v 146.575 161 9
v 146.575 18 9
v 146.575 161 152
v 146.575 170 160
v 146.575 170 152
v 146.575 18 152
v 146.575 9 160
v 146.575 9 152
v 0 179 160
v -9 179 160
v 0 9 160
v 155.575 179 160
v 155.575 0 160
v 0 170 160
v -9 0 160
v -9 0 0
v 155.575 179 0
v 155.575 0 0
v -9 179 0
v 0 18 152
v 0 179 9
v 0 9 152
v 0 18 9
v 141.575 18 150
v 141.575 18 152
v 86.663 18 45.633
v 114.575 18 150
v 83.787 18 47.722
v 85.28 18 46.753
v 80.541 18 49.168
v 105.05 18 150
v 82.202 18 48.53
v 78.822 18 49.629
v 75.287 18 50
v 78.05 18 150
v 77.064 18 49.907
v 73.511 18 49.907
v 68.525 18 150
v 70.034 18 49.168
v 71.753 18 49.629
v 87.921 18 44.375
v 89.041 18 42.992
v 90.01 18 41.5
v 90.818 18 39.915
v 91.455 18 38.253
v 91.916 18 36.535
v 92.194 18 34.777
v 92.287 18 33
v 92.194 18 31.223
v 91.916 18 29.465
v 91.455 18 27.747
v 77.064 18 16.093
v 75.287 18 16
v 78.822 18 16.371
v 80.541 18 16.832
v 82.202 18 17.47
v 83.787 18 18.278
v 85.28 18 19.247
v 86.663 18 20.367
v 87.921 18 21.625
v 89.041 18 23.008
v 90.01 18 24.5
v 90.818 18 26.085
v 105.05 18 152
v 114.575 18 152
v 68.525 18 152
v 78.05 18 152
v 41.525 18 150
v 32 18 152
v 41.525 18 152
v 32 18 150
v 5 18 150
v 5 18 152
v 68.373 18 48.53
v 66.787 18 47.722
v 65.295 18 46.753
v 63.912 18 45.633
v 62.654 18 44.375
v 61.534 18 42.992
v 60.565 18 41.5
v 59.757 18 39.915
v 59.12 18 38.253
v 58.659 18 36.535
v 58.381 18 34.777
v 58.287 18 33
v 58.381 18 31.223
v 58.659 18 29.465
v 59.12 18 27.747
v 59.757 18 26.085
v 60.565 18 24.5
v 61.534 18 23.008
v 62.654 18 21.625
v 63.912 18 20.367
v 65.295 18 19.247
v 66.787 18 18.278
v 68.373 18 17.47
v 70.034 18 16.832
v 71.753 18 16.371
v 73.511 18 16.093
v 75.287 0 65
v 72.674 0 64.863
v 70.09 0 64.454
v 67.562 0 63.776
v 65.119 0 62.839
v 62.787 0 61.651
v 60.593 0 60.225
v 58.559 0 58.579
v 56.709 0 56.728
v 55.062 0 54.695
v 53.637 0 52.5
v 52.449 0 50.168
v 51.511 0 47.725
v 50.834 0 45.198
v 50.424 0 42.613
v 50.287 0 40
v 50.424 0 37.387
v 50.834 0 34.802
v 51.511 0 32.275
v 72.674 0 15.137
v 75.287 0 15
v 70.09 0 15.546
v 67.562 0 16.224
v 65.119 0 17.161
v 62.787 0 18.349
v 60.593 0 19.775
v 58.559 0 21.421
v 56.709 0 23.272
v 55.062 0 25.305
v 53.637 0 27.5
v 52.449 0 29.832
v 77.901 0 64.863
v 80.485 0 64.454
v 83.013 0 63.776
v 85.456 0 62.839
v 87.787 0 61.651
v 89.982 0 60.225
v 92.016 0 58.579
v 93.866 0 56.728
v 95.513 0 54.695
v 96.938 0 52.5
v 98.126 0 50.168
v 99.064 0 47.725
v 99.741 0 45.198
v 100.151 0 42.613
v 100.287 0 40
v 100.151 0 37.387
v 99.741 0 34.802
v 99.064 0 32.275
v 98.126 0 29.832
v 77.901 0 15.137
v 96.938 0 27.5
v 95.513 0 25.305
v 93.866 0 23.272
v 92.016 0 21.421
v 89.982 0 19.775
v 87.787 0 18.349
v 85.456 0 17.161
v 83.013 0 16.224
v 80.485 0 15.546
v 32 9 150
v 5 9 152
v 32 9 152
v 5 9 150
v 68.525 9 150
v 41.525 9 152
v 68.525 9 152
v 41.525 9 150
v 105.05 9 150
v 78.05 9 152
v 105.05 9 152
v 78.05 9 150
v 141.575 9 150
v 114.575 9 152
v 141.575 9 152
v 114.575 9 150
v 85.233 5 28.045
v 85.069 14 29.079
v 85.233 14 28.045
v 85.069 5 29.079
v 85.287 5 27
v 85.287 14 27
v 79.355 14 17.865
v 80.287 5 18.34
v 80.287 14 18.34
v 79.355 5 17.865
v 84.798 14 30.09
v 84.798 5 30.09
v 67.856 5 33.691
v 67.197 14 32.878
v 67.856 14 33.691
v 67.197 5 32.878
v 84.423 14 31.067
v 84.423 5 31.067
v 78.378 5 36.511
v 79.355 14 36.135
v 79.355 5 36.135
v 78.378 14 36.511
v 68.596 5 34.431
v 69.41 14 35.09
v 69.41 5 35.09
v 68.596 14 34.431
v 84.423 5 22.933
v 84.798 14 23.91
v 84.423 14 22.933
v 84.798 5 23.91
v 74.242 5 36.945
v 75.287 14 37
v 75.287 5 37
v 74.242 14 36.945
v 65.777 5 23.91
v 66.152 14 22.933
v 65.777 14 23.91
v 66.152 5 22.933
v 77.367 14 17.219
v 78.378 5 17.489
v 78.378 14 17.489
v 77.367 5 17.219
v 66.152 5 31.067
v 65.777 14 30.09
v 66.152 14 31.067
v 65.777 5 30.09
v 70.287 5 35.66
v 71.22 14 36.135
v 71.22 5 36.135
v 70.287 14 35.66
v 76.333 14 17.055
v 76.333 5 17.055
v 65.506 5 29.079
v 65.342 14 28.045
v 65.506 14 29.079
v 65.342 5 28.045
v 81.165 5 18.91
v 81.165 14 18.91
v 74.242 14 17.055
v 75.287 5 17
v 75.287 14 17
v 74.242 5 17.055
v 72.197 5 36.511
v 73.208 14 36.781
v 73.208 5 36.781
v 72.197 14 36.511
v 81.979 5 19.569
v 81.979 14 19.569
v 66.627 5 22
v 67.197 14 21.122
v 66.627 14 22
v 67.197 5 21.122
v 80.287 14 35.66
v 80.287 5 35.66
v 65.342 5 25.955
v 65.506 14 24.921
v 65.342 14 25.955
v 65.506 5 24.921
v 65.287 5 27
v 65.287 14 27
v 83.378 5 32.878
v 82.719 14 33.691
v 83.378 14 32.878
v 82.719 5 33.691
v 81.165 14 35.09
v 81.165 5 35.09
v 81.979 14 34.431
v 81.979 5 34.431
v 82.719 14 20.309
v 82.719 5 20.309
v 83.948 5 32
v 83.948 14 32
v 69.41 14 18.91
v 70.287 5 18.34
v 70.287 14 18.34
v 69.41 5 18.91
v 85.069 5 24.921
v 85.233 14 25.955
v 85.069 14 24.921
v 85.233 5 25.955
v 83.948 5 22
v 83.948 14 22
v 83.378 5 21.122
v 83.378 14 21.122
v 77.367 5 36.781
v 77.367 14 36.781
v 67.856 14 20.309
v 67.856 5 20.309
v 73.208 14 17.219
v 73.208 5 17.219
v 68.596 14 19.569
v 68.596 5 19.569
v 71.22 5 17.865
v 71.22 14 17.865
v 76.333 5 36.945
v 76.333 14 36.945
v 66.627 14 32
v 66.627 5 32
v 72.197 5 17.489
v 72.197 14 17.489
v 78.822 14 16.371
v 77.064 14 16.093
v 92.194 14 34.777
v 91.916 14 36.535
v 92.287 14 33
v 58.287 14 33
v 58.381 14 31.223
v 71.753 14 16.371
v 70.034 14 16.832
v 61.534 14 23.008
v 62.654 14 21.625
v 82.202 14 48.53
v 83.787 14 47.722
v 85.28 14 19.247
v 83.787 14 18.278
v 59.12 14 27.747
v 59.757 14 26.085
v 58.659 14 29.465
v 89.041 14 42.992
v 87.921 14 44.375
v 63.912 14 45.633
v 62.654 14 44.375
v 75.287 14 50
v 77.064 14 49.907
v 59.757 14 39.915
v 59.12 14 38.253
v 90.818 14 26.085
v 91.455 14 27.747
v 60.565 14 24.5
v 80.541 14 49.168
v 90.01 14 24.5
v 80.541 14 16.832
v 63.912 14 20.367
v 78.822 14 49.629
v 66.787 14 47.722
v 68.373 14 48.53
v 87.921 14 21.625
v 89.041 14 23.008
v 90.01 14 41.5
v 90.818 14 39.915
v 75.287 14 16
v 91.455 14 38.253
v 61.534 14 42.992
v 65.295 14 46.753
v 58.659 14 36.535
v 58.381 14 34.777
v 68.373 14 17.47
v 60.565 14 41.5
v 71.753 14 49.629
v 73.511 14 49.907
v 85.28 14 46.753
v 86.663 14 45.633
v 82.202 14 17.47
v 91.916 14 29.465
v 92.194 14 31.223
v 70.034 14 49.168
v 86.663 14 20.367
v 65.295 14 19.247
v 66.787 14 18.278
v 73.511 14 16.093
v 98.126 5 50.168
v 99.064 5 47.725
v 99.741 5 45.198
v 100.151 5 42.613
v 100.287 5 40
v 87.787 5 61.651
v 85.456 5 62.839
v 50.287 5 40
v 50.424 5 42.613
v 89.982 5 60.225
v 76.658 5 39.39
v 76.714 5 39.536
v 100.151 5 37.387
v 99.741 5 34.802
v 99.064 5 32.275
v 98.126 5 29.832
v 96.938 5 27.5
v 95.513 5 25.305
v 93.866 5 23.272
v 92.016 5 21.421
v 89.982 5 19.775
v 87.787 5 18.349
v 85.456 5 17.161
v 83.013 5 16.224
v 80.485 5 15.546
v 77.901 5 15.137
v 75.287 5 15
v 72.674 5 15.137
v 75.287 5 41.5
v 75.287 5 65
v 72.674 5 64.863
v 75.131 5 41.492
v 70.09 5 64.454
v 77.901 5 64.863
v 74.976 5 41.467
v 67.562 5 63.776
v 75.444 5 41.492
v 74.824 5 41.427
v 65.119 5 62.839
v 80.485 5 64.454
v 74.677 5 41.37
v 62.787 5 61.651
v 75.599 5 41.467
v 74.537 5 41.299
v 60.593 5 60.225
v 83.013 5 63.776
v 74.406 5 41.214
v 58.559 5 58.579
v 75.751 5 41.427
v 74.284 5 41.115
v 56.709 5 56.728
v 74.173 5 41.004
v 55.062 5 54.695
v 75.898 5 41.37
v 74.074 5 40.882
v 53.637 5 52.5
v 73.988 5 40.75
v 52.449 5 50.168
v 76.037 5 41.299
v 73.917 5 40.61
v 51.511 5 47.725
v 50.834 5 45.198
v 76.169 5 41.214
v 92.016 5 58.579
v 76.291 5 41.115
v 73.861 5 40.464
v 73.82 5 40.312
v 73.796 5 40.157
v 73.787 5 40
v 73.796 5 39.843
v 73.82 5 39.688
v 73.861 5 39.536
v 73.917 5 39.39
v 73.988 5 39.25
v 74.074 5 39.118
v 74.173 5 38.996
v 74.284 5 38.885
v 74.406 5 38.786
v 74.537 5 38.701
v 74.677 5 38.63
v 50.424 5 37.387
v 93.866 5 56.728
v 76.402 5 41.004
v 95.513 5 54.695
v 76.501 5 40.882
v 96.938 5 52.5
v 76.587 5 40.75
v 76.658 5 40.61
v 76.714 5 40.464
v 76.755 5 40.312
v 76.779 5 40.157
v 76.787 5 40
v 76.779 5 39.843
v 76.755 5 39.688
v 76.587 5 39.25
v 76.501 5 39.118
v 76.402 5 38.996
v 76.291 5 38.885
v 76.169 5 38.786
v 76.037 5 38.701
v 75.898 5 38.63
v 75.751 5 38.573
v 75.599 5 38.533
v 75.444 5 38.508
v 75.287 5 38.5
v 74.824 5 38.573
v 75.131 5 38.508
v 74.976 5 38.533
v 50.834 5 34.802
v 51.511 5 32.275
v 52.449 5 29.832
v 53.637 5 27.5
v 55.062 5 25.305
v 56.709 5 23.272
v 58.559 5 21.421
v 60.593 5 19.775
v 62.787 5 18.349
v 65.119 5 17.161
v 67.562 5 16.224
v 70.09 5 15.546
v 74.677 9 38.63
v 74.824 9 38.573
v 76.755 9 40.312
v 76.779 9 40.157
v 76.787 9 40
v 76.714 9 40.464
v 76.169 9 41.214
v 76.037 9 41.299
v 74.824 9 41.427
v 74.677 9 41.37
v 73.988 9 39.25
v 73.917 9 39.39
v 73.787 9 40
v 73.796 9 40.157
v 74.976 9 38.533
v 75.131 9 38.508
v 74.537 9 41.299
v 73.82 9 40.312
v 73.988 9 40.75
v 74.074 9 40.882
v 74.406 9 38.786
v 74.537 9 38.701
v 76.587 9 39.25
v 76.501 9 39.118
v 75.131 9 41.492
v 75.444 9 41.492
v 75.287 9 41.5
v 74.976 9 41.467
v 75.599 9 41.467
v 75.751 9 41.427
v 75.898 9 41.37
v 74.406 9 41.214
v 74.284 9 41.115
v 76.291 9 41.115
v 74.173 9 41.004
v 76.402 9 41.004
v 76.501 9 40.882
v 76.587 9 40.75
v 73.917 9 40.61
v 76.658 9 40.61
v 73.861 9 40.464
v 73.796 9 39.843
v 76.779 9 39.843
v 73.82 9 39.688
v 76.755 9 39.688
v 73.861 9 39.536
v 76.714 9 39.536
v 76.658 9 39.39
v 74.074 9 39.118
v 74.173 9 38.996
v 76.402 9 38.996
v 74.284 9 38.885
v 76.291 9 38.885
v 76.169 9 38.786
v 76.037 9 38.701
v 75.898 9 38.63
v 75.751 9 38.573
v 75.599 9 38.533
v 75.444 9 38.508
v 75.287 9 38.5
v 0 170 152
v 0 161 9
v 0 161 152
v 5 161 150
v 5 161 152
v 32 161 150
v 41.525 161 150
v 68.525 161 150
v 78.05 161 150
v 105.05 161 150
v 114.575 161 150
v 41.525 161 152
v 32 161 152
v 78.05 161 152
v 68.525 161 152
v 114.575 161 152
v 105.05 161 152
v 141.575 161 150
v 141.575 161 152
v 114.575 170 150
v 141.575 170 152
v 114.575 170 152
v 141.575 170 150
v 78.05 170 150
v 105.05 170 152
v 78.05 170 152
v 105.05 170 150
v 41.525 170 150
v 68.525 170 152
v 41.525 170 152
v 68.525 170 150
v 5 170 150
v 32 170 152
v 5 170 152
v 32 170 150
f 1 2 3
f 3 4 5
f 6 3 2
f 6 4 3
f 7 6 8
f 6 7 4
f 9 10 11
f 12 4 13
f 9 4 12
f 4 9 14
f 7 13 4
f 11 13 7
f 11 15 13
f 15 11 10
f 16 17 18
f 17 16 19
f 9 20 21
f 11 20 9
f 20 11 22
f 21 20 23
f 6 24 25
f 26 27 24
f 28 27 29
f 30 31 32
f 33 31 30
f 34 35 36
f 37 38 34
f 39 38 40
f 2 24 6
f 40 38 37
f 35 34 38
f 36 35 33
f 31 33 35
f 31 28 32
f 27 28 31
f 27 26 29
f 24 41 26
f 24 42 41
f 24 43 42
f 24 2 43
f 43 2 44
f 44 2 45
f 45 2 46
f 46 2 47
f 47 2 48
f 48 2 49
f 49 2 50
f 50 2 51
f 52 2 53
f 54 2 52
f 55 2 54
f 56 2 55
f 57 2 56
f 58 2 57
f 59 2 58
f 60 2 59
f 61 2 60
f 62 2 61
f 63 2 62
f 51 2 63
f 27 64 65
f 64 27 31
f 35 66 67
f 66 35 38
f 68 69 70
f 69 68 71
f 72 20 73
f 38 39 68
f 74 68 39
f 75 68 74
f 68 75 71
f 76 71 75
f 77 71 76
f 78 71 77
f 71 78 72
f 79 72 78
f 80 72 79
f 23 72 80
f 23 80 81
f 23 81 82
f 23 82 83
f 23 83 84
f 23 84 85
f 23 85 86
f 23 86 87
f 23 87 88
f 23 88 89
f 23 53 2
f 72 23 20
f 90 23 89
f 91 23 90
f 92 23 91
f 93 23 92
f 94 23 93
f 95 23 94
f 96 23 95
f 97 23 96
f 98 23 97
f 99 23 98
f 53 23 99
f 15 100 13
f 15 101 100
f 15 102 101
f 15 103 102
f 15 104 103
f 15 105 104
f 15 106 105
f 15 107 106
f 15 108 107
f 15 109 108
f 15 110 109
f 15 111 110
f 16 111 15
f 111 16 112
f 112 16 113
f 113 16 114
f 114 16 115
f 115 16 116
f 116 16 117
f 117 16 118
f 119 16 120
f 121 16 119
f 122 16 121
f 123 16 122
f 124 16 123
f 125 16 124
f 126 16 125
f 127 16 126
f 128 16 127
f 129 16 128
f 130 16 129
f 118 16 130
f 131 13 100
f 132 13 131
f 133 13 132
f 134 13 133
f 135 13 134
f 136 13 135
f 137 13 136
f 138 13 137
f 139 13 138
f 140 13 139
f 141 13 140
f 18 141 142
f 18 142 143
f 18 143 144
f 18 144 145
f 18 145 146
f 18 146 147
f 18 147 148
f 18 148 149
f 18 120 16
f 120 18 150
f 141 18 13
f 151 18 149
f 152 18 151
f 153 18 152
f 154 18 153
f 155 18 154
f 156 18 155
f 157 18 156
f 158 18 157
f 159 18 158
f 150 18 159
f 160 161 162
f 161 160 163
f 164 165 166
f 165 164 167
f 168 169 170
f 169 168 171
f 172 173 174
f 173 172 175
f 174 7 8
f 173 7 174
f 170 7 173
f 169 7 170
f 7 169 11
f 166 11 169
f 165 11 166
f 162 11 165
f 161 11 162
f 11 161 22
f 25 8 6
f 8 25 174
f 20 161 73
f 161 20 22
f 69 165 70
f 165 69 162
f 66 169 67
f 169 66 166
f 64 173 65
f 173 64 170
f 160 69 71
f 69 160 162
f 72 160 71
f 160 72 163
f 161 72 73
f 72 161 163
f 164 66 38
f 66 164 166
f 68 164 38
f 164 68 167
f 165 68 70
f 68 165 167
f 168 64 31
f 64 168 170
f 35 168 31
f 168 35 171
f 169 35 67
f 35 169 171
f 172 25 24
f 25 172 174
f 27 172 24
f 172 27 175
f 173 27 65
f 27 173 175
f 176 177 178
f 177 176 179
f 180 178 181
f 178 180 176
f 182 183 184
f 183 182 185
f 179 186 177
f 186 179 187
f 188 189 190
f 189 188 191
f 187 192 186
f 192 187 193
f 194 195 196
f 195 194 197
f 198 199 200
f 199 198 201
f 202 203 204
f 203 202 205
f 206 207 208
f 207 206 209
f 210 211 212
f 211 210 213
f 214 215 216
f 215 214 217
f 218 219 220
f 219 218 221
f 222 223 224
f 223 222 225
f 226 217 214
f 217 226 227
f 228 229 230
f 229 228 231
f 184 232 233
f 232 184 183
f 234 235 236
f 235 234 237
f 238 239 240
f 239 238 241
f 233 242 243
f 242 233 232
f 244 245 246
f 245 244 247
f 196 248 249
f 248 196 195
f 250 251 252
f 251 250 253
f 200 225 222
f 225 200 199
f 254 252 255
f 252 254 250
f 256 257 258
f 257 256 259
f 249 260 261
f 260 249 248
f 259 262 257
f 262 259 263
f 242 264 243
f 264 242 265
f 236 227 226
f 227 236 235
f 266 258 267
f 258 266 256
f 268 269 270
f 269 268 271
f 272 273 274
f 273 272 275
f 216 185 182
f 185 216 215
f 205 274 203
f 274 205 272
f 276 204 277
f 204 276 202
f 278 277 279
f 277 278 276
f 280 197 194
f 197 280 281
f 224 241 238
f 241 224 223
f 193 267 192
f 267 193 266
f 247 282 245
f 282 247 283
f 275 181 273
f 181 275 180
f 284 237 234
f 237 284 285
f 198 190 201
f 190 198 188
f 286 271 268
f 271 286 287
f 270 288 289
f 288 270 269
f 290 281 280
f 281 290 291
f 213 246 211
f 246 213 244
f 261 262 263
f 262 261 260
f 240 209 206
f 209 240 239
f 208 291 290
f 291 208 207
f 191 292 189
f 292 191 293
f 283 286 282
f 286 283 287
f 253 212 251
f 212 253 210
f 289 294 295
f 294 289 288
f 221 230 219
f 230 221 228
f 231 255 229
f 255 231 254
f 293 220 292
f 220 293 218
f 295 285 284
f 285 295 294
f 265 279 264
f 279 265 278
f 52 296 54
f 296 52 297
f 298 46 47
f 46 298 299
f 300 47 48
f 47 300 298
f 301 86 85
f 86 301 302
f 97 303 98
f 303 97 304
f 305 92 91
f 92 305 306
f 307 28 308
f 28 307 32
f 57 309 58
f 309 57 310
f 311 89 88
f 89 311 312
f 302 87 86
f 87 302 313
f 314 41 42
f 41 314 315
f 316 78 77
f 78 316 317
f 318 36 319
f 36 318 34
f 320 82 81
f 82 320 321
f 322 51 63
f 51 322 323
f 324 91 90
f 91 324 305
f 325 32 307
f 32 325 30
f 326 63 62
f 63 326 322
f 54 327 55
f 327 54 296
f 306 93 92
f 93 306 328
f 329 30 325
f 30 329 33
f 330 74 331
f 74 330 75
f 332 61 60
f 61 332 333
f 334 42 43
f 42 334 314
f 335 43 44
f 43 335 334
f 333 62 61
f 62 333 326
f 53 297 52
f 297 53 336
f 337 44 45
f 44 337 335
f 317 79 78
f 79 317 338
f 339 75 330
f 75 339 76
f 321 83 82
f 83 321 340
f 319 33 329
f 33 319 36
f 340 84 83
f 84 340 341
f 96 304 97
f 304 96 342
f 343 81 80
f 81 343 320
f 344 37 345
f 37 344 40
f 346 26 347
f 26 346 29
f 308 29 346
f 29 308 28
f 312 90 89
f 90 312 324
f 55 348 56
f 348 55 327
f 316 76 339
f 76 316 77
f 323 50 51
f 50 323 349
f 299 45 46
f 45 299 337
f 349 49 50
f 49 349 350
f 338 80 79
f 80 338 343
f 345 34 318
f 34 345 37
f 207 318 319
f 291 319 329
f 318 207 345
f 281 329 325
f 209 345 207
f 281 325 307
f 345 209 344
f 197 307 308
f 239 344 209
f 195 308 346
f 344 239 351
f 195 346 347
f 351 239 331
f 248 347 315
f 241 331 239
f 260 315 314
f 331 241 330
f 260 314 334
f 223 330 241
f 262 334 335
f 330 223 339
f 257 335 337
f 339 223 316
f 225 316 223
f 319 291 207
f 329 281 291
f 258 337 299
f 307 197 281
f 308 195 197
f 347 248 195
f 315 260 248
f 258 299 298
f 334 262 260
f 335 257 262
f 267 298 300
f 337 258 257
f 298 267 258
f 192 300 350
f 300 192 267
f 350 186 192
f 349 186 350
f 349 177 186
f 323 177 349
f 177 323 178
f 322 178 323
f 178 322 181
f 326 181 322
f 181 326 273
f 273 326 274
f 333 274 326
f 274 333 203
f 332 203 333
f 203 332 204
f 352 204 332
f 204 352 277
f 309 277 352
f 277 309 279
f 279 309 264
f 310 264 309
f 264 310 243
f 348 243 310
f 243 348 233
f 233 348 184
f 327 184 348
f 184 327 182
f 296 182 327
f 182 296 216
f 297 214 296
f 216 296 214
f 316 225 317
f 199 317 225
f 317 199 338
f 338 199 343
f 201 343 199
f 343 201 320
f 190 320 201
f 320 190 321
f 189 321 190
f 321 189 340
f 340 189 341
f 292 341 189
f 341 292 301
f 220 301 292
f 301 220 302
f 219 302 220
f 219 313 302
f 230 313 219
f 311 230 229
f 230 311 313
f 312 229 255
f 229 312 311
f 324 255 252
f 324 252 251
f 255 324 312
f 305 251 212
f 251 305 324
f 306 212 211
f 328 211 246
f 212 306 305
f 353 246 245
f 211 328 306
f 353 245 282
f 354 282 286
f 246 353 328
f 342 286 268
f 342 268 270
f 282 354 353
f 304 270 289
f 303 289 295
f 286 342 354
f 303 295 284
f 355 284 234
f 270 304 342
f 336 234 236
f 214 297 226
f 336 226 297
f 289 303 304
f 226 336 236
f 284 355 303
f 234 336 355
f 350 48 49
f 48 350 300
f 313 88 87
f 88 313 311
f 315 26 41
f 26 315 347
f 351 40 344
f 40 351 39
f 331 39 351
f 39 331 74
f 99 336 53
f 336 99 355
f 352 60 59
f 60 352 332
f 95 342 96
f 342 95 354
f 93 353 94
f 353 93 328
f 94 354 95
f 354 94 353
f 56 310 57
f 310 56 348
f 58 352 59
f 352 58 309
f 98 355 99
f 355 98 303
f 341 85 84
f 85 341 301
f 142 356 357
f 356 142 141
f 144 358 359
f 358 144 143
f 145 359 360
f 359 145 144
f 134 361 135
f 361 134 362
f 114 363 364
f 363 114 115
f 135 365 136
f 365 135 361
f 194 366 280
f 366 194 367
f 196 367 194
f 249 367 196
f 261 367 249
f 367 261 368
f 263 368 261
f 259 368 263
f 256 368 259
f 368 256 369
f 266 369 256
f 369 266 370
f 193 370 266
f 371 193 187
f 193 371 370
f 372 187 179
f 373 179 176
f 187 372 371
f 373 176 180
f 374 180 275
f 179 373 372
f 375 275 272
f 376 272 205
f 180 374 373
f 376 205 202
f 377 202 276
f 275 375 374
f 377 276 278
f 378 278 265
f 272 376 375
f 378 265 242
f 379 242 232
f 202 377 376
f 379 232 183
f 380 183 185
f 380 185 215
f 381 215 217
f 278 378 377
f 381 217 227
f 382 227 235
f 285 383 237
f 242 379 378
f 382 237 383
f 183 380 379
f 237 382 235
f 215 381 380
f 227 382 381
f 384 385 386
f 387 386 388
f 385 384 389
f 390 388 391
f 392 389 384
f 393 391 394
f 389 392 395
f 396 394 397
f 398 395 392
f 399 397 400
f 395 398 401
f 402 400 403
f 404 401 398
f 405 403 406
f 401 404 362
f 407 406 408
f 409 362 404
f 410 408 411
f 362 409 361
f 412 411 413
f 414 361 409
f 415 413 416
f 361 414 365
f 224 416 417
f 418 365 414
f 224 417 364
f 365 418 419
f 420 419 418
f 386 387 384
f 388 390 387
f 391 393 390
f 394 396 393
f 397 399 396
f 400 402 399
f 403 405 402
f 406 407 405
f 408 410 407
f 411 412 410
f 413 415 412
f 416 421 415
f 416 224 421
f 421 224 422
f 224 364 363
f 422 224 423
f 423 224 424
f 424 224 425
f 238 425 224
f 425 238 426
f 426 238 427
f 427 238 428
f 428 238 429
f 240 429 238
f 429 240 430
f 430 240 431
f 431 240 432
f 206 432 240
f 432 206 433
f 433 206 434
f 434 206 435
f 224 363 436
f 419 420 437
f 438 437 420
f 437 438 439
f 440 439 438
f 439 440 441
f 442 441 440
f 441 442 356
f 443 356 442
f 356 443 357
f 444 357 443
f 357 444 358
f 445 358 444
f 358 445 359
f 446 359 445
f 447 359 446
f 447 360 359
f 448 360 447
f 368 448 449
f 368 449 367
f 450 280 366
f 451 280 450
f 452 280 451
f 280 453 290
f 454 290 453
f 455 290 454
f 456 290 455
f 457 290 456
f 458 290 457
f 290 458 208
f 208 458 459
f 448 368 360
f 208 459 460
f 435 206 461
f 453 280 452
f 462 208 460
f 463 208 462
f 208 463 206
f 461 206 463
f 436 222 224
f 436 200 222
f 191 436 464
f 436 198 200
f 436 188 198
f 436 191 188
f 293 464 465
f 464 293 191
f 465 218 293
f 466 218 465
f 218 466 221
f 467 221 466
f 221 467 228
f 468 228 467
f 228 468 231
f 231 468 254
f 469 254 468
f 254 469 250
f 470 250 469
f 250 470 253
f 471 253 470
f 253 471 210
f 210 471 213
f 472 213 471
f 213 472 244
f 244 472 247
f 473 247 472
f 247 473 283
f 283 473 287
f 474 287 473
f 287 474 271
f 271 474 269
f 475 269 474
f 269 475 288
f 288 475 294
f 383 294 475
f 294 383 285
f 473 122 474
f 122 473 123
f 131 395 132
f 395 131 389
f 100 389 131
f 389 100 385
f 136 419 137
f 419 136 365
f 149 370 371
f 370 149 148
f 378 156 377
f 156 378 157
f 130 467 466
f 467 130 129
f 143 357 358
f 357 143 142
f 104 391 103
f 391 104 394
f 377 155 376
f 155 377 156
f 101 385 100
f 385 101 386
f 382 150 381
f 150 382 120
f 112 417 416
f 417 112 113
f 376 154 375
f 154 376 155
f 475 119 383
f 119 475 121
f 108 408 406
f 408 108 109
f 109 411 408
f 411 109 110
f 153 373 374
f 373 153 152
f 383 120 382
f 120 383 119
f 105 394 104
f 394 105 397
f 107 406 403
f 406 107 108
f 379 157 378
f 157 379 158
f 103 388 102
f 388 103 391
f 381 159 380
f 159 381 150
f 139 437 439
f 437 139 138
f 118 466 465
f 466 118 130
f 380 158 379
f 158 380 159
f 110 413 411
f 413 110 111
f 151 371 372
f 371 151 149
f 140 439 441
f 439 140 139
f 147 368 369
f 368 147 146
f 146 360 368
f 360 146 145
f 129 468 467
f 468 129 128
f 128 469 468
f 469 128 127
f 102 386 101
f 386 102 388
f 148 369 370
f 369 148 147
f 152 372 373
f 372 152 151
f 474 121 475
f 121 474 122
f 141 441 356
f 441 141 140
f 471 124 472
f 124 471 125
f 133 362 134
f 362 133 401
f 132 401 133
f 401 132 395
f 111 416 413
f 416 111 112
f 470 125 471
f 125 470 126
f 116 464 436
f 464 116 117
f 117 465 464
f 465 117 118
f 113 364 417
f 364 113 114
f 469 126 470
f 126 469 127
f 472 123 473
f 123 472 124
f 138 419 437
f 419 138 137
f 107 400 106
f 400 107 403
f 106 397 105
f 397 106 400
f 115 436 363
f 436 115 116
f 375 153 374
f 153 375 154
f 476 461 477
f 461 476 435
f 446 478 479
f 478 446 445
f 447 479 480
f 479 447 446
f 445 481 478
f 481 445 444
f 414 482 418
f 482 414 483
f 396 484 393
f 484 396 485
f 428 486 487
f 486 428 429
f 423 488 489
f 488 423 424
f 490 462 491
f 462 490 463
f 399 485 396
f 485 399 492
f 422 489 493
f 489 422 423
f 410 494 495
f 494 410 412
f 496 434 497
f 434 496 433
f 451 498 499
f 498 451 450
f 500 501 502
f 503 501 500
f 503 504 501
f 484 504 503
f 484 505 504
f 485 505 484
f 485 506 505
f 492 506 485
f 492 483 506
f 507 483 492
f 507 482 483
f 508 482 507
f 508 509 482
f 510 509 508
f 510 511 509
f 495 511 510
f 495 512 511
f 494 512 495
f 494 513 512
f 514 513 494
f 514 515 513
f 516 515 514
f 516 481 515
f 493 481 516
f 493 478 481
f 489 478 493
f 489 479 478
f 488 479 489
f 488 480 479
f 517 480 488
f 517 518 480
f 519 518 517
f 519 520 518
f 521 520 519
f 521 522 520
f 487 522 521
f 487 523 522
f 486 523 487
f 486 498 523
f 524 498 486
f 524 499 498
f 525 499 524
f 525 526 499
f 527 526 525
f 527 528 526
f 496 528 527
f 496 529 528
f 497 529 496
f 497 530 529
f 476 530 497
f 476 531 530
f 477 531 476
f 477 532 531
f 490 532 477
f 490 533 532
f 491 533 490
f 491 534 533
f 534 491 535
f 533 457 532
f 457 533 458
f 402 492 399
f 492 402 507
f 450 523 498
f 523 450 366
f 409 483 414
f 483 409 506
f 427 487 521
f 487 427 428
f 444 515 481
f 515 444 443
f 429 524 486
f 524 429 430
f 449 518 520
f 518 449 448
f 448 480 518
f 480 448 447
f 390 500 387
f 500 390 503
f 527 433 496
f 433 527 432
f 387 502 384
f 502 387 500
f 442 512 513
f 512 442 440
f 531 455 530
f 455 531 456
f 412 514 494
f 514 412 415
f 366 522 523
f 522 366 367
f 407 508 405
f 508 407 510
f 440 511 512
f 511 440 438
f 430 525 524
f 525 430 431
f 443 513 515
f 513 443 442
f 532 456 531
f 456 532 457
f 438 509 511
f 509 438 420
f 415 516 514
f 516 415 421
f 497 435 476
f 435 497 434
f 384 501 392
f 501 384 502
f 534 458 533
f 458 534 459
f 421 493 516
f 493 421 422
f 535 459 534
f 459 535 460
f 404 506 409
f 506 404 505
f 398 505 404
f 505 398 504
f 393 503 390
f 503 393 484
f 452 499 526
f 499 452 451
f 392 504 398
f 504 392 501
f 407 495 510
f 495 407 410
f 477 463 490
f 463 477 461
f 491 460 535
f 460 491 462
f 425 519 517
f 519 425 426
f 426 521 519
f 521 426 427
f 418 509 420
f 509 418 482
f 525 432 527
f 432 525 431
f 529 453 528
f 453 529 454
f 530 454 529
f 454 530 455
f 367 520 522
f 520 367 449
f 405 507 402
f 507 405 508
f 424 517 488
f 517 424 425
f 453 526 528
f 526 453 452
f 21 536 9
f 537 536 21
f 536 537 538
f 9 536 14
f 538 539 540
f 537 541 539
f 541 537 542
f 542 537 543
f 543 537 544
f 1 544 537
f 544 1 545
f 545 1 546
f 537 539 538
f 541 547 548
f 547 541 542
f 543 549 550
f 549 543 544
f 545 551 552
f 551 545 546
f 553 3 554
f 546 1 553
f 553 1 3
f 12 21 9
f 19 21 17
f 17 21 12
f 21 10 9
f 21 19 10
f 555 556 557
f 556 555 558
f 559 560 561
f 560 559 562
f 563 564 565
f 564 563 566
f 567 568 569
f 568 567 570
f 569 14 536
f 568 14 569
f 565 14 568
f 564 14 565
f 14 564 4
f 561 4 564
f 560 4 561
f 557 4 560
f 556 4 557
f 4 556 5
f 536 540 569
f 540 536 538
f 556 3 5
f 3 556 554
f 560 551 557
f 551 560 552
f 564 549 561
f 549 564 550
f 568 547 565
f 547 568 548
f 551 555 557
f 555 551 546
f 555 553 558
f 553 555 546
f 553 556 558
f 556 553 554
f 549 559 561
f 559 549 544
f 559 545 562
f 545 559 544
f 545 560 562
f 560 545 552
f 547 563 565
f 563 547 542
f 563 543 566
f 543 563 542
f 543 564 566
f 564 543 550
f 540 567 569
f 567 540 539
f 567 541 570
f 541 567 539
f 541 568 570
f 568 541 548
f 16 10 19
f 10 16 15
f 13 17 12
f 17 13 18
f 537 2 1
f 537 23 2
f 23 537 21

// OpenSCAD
/*
Open 4 Frame Mating Nuc, 
released to the Public Domain by Robert Niles
*/
//frame top bar width: 161mm

// these sizes are the best
// doesn't include each 9mm side
// the width allows the use of three frames which can be
// spanned together equaling one full standard langstroth frame
// so you can start them in a regular hive and/or move them
// from the nuc to a regular hive when finished.

width = 146.575; 
// set depth back to 150
depth = 179;
framelength = depth-19;
echo(framelength=framelength);
height = 160;

// front wall
difference() {
fb_wall(width,height);
translate([(width/2)-25,0,8]) entrance_area();    
}    
// back wall
translate([width,depth,0]) rotate([180,180,0]) fb_wall(width,height);

// side 1
color("green") translate([-9,0,0]) cube([9,depth,height]);


// side 2
color("green") translate([width,0,0]) cube([9,depth,height]);


//bottom
cube([width,depth,9]);





module fb_wall(w=128.1,h=185){  
    difference() {
        // basic side
        cube([w,18,h]);
        
        // frame ledge
        translate([w,9,h-8]) rotate([0,0,90]) cube([9.525,w,16.1]);

        // frame divvets
        translate([5,9,h-10]) cube([27,9.525,14]);
        translate([5+27+9.525,9,h-10]) cube([27,9.525,14]);
        translate([5+27+9.525+27+9.525,9,h-10]) cube([27,9.525,14]);
        translate([5+27+9.525+27+9.525+27+9.525,9,h-10]) cube([27,9.525,14]);   
    }
}


module entrance_area() {
        $fn=60;
        // create the entrance hole
        translate([27,20,19]) {
            rotate([90,0,0]) {
                color("green") {
                cylinder(h=21, r=10);
               }
            }
        }
        

        translate([27,35,25]) {
            rotate([90,0,0]) {
                color("blue") {
                cylinder(h=21, r=17);
               }
            }
        }
        
            
        // gate area
        translate([27,5,32]) {
            rotate([90,0,0]) {
                color("green") {
                cylinder(h=6, r=25);
               }
            }
        }
        
        // gate area screw hole
        translate([27,9,32]) {
            rotate([90,0,0]) {
                color("red") {
                cylinder(h=10, r=1.5);
               }
            }
        }        
}





    



   
    
